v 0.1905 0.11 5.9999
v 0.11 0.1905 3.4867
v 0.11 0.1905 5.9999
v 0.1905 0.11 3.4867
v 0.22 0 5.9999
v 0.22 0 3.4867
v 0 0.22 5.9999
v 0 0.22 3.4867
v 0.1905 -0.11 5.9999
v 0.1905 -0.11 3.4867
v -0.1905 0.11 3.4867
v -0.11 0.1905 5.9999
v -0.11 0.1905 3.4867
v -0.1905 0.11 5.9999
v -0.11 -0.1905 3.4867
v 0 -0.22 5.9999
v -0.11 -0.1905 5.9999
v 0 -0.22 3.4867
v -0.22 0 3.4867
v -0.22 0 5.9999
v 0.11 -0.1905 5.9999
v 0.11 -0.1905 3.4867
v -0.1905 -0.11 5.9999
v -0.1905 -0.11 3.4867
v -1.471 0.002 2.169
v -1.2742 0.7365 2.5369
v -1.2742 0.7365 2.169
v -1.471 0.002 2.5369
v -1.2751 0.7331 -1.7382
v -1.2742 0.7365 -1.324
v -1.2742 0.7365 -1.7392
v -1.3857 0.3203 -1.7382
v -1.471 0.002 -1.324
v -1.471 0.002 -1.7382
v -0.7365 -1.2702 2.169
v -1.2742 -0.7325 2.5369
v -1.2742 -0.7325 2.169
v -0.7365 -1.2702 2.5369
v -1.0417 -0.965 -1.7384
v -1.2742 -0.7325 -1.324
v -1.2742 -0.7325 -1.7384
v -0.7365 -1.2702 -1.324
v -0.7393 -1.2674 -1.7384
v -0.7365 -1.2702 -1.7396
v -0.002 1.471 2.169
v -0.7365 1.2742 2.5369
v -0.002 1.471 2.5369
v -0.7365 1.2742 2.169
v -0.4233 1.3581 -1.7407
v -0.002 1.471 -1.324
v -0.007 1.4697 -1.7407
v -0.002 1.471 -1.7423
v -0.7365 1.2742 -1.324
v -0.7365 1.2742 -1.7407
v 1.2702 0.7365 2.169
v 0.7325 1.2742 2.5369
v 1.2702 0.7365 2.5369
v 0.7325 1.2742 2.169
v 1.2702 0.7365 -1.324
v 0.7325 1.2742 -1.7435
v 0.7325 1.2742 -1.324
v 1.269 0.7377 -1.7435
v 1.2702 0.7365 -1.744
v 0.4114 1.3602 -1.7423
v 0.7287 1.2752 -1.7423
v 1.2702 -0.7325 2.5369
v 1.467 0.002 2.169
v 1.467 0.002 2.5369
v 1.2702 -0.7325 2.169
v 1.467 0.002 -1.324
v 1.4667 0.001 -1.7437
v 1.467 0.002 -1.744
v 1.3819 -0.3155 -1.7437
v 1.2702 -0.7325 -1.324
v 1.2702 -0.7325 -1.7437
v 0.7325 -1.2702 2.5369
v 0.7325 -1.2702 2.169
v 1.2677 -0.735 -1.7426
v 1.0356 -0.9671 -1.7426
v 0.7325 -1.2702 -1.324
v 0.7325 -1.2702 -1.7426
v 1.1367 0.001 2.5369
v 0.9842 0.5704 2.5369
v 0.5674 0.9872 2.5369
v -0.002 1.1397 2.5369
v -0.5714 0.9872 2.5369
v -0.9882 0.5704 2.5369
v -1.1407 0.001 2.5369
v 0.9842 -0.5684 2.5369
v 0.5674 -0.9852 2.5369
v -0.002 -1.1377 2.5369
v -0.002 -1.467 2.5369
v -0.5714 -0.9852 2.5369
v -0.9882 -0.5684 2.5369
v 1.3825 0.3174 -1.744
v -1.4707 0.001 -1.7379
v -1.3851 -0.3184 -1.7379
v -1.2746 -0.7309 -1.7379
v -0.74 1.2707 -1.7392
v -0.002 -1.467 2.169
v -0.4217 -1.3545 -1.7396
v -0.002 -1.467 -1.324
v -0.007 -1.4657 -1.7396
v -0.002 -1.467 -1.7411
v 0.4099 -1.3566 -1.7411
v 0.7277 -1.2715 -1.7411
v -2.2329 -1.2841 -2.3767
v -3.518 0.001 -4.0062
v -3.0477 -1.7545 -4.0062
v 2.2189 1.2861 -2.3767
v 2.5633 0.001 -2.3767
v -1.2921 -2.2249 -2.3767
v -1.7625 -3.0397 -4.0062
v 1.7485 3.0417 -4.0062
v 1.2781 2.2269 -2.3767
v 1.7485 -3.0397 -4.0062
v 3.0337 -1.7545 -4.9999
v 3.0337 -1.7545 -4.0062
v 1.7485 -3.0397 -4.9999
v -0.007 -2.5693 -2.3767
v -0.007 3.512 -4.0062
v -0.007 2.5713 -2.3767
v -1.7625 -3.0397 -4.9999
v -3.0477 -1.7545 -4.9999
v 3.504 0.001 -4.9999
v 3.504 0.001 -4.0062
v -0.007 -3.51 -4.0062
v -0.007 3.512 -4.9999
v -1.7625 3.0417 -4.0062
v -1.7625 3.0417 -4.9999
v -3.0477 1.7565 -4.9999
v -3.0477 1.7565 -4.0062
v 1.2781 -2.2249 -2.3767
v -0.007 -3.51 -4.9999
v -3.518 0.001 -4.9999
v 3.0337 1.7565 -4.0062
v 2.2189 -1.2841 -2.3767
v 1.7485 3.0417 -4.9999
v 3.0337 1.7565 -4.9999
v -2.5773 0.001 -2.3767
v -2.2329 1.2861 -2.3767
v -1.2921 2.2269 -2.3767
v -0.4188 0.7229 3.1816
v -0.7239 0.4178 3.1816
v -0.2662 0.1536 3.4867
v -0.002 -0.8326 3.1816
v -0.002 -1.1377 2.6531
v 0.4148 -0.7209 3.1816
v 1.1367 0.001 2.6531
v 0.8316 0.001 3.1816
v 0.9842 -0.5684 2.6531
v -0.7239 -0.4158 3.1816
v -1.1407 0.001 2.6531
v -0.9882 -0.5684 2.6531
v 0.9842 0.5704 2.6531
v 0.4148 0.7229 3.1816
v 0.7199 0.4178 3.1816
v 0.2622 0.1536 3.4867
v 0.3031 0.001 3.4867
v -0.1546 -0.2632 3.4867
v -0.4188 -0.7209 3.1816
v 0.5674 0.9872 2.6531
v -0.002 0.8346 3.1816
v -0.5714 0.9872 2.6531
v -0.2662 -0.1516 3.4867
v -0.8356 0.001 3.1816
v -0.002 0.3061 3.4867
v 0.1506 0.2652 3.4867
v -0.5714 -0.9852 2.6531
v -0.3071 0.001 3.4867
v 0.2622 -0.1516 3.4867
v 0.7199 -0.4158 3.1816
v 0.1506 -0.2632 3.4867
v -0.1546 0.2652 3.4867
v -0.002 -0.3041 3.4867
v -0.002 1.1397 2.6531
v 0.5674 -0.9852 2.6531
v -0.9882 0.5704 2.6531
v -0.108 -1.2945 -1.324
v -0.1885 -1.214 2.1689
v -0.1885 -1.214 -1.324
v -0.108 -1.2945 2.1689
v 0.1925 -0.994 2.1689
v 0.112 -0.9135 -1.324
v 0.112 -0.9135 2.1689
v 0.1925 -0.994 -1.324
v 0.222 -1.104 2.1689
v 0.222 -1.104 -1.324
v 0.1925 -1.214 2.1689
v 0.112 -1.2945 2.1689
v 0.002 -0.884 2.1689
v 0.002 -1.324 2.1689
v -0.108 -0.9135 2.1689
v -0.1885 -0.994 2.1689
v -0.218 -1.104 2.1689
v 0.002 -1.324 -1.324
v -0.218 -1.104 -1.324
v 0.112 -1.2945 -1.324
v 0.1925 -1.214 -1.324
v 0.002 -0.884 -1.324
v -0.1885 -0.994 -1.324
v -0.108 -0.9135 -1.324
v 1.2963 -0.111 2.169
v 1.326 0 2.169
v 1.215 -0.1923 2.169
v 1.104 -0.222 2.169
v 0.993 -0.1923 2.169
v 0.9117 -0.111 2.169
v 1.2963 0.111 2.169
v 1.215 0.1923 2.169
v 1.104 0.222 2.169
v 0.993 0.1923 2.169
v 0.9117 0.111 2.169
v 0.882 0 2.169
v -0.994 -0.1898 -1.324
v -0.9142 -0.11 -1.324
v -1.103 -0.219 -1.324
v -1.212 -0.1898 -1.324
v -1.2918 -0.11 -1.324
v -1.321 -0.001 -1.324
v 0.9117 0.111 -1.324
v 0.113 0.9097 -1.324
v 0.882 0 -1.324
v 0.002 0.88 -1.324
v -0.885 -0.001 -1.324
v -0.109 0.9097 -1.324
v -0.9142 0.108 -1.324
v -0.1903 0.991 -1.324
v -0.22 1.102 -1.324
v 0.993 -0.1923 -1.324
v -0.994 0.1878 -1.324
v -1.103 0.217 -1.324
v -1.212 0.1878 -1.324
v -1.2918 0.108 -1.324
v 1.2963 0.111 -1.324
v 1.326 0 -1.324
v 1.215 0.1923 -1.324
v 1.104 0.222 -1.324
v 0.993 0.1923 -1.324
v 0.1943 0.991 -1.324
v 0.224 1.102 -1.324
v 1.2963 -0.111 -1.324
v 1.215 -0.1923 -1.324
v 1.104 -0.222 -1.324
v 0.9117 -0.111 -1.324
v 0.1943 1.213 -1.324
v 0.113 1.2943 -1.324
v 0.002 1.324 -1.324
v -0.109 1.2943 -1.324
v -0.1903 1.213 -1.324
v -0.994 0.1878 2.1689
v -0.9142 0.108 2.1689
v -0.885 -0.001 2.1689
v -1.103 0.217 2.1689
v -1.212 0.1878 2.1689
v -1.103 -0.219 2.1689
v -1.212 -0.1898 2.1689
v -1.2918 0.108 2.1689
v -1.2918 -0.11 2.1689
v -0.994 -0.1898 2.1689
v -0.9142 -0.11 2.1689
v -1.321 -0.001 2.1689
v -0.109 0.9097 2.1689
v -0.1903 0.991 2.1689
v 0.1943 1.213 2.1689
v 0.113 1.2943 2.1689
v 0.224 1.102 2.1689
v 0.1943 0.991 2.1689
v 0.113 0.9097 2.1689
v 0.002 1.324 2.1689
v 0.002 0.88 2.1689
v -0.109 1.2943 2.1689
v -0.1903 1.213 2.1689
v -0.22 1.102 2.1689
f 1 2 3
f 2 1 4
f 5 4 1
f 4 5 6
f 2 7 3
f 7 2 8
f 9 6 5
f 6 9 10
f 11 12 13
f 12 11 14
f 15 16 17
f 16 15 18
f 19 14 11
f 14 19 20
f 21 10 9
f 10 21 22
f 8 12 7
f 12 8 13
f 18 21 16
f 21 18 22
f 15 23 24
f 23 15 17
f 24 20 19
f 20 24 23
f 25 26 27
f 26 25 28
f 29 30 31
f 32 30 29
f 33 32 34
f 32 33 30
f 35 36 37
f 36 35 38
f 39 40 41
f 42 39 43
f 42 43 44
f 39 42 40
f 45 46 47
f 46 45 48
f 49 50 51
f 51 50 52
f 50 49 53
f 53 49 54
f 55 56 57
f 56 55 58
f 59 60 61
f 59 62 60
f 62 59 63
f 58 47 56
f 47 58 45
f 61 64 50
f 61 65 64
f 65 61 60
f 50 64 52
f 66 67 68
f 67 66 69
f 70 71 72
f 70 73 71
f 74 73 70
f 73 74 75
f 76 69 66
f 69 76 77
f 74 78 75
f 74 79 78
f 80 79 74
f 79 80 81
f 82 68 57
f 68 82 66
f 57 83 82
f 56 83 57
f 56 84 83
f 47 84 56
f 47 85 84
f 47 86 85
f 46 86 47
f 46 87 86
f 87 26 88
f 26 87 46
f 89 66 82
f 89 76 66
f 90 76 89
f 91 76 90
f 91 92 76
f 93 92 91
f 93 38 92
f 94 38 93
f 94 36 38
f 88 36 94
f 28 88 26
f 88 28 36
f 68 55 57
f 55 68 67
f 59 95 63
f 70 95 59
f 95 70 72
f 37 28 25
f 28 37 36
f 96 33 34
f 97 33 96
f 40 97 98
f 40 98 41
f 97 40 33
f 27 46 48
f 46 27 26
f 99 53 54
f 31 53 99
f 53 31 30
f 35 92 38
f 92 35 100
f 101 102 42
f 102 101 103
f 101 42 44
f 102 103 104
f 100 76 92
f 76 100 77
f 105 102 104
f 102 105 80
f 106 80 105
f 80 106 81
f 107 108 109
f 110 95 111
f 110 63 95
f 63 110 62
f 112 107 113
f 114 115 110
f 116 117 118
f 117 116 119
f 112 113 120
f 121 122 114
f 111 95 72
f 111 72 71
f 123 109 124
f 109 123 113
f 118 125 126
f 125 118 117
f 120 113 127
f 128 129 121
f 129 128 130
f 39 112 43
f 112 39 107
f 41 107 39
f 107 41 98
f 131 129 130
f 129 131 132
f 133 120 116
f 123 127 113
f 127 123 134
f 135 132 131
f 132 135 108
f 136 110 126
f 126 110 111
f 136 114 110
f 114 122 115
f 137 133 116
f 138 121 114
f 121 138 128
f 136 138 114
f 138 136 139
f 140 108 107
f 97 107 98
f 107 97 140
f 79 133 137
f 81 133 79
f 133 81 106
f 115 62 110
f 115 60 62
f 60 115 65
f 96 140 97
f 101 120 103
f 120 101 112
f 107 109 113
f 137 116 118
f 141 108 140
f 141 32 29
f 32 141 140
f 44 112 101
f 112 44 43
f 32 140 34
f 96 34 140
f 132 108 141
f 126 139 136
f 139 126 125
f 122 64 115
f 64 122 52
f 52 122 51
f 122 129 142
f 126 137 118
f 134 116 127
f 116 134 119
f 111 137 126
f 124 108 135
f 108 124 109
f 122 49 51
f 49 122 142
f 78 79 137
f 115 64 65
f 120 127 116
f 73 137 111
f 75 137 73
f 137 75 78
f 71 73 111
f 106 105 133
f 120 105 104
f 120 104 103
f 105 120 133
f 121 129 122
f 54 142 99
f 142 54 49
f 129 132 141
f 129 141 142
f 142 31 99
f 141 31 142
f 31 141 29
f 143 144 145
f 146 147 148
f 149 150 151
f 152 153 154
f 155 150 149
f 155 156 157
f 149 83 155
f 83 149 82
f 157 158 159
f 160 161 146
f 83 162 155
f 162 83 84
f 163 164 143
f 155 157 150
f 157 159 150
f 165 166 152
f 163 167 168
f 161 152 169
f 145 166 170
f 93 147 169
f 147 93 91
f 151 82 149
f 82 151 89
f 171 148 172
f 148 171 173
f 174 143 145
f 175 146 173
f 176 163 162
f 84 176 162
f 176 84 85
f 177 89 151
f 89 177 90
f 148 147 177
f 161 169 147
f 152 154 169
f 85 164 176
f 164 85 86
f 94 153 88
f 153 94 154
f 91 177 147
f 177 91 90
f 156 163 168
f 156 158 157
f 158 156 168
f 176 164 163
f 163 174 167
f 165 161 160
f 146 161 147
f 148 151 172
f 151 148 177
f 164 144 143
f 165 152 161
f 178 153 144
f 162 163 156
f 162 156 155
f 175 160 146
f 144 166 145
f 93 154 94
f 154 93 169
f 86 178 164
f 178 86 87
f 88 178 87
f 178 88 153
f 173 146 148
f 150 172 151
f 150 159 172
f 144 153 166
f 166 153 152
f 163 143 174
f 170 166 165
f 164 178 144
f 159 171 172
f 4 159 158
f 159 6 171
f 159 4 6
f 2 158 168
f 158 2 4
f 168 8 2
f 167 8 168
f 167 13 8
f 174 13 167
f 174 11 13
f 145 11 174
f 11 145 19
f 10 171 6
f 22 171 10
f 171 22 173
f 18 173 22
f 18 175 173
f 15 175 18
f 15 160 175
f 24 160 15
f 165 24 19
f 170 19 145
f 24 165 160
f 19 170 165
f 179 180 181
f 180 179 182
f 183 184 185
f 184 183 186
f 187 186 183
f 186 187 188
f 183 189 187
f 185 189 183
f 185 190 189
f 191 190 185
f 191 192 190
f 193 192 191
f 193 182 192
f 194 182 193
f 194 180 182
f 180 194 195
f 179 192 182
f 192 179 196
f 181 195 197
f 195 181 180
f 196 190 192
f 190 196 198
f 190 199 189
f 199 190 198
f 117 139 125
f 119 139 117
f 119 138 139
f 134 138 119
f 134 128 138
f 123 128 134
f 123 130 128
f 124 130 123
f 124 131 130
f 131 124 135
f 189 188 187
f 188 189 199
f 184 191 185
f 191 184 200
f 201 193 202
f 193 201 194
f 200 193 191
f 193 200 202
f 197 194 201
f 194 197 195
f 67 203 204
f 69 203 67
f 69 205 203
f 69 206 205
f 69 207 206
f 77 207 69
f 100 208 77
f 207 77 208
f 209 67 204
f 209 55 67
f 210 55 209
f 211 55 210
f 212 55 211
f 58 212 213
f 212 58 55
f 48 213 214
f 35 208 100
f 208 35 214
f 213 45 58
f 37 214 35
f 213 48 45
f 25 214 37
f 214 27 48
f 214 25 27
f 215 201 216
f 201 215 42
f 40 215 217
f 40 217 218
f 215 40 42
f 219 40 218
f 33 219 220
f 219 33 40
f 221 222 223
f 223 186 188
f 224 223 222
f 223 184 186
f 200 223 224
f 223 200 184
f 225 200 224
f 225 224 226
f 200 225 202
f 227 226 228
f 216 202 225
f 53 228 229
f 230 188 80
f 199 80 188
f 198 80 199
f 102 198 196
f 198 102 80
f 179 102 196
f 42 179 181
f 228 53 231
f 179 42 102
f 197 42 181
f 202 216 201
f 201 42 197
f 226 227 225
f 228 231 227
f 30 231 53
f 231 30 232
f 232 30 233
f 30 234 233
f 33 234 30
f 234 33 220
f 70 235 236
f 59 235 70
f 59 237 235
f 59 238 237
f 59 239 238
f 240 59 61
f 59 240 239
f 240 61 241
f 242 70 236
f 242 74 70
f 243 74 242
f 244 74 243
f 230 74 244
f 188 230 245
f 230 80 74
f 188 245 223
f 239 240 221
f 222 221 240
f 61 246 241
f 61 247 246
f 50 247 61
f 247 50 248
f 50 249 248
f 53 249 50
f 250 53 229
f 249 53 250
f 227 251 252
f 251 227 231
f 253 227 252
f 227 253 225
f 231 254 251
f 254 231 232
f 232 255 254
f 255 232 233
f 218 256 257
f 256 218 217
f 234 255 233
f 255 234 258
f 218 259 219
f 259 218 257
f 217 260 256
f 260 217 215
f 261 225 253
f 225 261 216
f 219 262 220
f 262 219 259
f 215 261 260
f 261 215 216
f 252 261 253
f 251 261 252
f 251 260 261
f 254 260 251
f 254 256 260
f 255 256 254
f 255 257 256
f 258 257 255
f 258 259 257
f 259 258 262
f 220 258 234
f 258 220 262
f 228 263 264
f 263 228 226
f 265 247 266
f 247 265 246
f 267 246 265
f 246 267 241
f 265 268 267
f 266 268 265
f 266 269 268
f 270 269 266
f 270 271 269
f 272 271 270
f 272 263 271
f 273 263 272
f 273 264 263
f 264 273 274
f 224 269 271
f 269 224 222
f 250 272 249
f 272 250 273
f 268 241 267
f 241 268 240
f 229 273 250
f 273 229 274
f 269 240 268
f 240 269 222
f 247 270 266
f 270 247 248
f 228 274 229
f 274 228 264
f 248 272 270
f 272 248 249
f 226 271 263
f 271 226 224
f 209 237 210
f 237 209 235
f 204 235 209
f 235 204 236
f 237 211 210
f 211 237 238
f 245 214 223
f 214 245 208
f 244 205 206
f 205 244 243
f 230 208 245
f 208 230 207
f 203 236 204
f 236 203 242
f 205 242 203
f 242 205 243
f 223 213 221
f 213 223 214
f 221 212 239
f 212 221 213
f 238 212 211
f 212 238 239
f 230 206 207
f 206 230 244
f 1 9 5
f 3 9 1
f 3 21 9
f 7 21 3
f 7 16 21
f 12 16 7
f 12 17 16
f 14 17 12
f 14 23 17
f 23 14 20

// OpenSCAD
intersection() {
  union() {
    translate([0.002, 1.102, -1.4155])
    cylinder(h = 7.1689, r1 = 0.222, r2 = 0.222, center = true, $fn = 12);
  
    intersection() {
      union() {
        translate([-0.002, 0.002, -7.8315])
        rotate([180, 0, 180])
        cylinder(h = 20.7369, r1 = 1.469, r2 = 1.469, center = true, $fn = 12);
      
        translate([-0.007, 0.001, -4.947])
        sphere(r = 3.6349, $fn = 12);
      
        intersection() {
          translate([0, 0, 8.438])
          cylinder(h = 19.5239, r1 = 0.22, r2 = 0.22, center = true, $fn = 12);
        
          sphere(r = 54.5999, $fn = 109);
        }
      
        translate([-0.002, 0.001, 2.348])
        sphere(r = 1.1789, $fn = 12);
      }
    
      union() {
        intersection() {
          translate([0.002, -1.104, -1.4155])
          cylinder(h = 7.1689, r1 = 0.22, r2 = 0.22, center = true, $fn = 12);
        
          sphere(r = 54.5999, $fn = 109);
        }
      
        translate([-1.103, -0.001, -1.4155])
        cylinder(h = 7.1689, r1 = 0.218, r2 = 0.218, center = true, $fn = 12);
      
        difference() {
          union() {
            translate([-0.002, 0.002, 10.1845])
            rotate([180, 0, 180])
            cylinder(h = 16.0309, r1 = 1.469, r2 = 1.469, center = true, $fn = 12);
          
            translate([0, 0, -3.162])
            cube(size = [36.3999, 36.3999, 3.6759], center = true);
          }
        
          translate([-0.002, 0.002, -11.6])
          rotate([180, 0, 180])
          cylinder(h = 13.2, r1 = 1.469, r2 = 1.469, center = true, $fn = 12);
        }
      }
    }
  
    translate([1.104, 0, -1.2315])
    cylinder(h = 7.5369, r1 = 0.222, r2 = 0.222, center = true, $fn = 12);
  }

  translate([-0.0005, -0.0005, 0])
  cube(size = [8.8109, 8.8109, 11.9999], center = true);
}
